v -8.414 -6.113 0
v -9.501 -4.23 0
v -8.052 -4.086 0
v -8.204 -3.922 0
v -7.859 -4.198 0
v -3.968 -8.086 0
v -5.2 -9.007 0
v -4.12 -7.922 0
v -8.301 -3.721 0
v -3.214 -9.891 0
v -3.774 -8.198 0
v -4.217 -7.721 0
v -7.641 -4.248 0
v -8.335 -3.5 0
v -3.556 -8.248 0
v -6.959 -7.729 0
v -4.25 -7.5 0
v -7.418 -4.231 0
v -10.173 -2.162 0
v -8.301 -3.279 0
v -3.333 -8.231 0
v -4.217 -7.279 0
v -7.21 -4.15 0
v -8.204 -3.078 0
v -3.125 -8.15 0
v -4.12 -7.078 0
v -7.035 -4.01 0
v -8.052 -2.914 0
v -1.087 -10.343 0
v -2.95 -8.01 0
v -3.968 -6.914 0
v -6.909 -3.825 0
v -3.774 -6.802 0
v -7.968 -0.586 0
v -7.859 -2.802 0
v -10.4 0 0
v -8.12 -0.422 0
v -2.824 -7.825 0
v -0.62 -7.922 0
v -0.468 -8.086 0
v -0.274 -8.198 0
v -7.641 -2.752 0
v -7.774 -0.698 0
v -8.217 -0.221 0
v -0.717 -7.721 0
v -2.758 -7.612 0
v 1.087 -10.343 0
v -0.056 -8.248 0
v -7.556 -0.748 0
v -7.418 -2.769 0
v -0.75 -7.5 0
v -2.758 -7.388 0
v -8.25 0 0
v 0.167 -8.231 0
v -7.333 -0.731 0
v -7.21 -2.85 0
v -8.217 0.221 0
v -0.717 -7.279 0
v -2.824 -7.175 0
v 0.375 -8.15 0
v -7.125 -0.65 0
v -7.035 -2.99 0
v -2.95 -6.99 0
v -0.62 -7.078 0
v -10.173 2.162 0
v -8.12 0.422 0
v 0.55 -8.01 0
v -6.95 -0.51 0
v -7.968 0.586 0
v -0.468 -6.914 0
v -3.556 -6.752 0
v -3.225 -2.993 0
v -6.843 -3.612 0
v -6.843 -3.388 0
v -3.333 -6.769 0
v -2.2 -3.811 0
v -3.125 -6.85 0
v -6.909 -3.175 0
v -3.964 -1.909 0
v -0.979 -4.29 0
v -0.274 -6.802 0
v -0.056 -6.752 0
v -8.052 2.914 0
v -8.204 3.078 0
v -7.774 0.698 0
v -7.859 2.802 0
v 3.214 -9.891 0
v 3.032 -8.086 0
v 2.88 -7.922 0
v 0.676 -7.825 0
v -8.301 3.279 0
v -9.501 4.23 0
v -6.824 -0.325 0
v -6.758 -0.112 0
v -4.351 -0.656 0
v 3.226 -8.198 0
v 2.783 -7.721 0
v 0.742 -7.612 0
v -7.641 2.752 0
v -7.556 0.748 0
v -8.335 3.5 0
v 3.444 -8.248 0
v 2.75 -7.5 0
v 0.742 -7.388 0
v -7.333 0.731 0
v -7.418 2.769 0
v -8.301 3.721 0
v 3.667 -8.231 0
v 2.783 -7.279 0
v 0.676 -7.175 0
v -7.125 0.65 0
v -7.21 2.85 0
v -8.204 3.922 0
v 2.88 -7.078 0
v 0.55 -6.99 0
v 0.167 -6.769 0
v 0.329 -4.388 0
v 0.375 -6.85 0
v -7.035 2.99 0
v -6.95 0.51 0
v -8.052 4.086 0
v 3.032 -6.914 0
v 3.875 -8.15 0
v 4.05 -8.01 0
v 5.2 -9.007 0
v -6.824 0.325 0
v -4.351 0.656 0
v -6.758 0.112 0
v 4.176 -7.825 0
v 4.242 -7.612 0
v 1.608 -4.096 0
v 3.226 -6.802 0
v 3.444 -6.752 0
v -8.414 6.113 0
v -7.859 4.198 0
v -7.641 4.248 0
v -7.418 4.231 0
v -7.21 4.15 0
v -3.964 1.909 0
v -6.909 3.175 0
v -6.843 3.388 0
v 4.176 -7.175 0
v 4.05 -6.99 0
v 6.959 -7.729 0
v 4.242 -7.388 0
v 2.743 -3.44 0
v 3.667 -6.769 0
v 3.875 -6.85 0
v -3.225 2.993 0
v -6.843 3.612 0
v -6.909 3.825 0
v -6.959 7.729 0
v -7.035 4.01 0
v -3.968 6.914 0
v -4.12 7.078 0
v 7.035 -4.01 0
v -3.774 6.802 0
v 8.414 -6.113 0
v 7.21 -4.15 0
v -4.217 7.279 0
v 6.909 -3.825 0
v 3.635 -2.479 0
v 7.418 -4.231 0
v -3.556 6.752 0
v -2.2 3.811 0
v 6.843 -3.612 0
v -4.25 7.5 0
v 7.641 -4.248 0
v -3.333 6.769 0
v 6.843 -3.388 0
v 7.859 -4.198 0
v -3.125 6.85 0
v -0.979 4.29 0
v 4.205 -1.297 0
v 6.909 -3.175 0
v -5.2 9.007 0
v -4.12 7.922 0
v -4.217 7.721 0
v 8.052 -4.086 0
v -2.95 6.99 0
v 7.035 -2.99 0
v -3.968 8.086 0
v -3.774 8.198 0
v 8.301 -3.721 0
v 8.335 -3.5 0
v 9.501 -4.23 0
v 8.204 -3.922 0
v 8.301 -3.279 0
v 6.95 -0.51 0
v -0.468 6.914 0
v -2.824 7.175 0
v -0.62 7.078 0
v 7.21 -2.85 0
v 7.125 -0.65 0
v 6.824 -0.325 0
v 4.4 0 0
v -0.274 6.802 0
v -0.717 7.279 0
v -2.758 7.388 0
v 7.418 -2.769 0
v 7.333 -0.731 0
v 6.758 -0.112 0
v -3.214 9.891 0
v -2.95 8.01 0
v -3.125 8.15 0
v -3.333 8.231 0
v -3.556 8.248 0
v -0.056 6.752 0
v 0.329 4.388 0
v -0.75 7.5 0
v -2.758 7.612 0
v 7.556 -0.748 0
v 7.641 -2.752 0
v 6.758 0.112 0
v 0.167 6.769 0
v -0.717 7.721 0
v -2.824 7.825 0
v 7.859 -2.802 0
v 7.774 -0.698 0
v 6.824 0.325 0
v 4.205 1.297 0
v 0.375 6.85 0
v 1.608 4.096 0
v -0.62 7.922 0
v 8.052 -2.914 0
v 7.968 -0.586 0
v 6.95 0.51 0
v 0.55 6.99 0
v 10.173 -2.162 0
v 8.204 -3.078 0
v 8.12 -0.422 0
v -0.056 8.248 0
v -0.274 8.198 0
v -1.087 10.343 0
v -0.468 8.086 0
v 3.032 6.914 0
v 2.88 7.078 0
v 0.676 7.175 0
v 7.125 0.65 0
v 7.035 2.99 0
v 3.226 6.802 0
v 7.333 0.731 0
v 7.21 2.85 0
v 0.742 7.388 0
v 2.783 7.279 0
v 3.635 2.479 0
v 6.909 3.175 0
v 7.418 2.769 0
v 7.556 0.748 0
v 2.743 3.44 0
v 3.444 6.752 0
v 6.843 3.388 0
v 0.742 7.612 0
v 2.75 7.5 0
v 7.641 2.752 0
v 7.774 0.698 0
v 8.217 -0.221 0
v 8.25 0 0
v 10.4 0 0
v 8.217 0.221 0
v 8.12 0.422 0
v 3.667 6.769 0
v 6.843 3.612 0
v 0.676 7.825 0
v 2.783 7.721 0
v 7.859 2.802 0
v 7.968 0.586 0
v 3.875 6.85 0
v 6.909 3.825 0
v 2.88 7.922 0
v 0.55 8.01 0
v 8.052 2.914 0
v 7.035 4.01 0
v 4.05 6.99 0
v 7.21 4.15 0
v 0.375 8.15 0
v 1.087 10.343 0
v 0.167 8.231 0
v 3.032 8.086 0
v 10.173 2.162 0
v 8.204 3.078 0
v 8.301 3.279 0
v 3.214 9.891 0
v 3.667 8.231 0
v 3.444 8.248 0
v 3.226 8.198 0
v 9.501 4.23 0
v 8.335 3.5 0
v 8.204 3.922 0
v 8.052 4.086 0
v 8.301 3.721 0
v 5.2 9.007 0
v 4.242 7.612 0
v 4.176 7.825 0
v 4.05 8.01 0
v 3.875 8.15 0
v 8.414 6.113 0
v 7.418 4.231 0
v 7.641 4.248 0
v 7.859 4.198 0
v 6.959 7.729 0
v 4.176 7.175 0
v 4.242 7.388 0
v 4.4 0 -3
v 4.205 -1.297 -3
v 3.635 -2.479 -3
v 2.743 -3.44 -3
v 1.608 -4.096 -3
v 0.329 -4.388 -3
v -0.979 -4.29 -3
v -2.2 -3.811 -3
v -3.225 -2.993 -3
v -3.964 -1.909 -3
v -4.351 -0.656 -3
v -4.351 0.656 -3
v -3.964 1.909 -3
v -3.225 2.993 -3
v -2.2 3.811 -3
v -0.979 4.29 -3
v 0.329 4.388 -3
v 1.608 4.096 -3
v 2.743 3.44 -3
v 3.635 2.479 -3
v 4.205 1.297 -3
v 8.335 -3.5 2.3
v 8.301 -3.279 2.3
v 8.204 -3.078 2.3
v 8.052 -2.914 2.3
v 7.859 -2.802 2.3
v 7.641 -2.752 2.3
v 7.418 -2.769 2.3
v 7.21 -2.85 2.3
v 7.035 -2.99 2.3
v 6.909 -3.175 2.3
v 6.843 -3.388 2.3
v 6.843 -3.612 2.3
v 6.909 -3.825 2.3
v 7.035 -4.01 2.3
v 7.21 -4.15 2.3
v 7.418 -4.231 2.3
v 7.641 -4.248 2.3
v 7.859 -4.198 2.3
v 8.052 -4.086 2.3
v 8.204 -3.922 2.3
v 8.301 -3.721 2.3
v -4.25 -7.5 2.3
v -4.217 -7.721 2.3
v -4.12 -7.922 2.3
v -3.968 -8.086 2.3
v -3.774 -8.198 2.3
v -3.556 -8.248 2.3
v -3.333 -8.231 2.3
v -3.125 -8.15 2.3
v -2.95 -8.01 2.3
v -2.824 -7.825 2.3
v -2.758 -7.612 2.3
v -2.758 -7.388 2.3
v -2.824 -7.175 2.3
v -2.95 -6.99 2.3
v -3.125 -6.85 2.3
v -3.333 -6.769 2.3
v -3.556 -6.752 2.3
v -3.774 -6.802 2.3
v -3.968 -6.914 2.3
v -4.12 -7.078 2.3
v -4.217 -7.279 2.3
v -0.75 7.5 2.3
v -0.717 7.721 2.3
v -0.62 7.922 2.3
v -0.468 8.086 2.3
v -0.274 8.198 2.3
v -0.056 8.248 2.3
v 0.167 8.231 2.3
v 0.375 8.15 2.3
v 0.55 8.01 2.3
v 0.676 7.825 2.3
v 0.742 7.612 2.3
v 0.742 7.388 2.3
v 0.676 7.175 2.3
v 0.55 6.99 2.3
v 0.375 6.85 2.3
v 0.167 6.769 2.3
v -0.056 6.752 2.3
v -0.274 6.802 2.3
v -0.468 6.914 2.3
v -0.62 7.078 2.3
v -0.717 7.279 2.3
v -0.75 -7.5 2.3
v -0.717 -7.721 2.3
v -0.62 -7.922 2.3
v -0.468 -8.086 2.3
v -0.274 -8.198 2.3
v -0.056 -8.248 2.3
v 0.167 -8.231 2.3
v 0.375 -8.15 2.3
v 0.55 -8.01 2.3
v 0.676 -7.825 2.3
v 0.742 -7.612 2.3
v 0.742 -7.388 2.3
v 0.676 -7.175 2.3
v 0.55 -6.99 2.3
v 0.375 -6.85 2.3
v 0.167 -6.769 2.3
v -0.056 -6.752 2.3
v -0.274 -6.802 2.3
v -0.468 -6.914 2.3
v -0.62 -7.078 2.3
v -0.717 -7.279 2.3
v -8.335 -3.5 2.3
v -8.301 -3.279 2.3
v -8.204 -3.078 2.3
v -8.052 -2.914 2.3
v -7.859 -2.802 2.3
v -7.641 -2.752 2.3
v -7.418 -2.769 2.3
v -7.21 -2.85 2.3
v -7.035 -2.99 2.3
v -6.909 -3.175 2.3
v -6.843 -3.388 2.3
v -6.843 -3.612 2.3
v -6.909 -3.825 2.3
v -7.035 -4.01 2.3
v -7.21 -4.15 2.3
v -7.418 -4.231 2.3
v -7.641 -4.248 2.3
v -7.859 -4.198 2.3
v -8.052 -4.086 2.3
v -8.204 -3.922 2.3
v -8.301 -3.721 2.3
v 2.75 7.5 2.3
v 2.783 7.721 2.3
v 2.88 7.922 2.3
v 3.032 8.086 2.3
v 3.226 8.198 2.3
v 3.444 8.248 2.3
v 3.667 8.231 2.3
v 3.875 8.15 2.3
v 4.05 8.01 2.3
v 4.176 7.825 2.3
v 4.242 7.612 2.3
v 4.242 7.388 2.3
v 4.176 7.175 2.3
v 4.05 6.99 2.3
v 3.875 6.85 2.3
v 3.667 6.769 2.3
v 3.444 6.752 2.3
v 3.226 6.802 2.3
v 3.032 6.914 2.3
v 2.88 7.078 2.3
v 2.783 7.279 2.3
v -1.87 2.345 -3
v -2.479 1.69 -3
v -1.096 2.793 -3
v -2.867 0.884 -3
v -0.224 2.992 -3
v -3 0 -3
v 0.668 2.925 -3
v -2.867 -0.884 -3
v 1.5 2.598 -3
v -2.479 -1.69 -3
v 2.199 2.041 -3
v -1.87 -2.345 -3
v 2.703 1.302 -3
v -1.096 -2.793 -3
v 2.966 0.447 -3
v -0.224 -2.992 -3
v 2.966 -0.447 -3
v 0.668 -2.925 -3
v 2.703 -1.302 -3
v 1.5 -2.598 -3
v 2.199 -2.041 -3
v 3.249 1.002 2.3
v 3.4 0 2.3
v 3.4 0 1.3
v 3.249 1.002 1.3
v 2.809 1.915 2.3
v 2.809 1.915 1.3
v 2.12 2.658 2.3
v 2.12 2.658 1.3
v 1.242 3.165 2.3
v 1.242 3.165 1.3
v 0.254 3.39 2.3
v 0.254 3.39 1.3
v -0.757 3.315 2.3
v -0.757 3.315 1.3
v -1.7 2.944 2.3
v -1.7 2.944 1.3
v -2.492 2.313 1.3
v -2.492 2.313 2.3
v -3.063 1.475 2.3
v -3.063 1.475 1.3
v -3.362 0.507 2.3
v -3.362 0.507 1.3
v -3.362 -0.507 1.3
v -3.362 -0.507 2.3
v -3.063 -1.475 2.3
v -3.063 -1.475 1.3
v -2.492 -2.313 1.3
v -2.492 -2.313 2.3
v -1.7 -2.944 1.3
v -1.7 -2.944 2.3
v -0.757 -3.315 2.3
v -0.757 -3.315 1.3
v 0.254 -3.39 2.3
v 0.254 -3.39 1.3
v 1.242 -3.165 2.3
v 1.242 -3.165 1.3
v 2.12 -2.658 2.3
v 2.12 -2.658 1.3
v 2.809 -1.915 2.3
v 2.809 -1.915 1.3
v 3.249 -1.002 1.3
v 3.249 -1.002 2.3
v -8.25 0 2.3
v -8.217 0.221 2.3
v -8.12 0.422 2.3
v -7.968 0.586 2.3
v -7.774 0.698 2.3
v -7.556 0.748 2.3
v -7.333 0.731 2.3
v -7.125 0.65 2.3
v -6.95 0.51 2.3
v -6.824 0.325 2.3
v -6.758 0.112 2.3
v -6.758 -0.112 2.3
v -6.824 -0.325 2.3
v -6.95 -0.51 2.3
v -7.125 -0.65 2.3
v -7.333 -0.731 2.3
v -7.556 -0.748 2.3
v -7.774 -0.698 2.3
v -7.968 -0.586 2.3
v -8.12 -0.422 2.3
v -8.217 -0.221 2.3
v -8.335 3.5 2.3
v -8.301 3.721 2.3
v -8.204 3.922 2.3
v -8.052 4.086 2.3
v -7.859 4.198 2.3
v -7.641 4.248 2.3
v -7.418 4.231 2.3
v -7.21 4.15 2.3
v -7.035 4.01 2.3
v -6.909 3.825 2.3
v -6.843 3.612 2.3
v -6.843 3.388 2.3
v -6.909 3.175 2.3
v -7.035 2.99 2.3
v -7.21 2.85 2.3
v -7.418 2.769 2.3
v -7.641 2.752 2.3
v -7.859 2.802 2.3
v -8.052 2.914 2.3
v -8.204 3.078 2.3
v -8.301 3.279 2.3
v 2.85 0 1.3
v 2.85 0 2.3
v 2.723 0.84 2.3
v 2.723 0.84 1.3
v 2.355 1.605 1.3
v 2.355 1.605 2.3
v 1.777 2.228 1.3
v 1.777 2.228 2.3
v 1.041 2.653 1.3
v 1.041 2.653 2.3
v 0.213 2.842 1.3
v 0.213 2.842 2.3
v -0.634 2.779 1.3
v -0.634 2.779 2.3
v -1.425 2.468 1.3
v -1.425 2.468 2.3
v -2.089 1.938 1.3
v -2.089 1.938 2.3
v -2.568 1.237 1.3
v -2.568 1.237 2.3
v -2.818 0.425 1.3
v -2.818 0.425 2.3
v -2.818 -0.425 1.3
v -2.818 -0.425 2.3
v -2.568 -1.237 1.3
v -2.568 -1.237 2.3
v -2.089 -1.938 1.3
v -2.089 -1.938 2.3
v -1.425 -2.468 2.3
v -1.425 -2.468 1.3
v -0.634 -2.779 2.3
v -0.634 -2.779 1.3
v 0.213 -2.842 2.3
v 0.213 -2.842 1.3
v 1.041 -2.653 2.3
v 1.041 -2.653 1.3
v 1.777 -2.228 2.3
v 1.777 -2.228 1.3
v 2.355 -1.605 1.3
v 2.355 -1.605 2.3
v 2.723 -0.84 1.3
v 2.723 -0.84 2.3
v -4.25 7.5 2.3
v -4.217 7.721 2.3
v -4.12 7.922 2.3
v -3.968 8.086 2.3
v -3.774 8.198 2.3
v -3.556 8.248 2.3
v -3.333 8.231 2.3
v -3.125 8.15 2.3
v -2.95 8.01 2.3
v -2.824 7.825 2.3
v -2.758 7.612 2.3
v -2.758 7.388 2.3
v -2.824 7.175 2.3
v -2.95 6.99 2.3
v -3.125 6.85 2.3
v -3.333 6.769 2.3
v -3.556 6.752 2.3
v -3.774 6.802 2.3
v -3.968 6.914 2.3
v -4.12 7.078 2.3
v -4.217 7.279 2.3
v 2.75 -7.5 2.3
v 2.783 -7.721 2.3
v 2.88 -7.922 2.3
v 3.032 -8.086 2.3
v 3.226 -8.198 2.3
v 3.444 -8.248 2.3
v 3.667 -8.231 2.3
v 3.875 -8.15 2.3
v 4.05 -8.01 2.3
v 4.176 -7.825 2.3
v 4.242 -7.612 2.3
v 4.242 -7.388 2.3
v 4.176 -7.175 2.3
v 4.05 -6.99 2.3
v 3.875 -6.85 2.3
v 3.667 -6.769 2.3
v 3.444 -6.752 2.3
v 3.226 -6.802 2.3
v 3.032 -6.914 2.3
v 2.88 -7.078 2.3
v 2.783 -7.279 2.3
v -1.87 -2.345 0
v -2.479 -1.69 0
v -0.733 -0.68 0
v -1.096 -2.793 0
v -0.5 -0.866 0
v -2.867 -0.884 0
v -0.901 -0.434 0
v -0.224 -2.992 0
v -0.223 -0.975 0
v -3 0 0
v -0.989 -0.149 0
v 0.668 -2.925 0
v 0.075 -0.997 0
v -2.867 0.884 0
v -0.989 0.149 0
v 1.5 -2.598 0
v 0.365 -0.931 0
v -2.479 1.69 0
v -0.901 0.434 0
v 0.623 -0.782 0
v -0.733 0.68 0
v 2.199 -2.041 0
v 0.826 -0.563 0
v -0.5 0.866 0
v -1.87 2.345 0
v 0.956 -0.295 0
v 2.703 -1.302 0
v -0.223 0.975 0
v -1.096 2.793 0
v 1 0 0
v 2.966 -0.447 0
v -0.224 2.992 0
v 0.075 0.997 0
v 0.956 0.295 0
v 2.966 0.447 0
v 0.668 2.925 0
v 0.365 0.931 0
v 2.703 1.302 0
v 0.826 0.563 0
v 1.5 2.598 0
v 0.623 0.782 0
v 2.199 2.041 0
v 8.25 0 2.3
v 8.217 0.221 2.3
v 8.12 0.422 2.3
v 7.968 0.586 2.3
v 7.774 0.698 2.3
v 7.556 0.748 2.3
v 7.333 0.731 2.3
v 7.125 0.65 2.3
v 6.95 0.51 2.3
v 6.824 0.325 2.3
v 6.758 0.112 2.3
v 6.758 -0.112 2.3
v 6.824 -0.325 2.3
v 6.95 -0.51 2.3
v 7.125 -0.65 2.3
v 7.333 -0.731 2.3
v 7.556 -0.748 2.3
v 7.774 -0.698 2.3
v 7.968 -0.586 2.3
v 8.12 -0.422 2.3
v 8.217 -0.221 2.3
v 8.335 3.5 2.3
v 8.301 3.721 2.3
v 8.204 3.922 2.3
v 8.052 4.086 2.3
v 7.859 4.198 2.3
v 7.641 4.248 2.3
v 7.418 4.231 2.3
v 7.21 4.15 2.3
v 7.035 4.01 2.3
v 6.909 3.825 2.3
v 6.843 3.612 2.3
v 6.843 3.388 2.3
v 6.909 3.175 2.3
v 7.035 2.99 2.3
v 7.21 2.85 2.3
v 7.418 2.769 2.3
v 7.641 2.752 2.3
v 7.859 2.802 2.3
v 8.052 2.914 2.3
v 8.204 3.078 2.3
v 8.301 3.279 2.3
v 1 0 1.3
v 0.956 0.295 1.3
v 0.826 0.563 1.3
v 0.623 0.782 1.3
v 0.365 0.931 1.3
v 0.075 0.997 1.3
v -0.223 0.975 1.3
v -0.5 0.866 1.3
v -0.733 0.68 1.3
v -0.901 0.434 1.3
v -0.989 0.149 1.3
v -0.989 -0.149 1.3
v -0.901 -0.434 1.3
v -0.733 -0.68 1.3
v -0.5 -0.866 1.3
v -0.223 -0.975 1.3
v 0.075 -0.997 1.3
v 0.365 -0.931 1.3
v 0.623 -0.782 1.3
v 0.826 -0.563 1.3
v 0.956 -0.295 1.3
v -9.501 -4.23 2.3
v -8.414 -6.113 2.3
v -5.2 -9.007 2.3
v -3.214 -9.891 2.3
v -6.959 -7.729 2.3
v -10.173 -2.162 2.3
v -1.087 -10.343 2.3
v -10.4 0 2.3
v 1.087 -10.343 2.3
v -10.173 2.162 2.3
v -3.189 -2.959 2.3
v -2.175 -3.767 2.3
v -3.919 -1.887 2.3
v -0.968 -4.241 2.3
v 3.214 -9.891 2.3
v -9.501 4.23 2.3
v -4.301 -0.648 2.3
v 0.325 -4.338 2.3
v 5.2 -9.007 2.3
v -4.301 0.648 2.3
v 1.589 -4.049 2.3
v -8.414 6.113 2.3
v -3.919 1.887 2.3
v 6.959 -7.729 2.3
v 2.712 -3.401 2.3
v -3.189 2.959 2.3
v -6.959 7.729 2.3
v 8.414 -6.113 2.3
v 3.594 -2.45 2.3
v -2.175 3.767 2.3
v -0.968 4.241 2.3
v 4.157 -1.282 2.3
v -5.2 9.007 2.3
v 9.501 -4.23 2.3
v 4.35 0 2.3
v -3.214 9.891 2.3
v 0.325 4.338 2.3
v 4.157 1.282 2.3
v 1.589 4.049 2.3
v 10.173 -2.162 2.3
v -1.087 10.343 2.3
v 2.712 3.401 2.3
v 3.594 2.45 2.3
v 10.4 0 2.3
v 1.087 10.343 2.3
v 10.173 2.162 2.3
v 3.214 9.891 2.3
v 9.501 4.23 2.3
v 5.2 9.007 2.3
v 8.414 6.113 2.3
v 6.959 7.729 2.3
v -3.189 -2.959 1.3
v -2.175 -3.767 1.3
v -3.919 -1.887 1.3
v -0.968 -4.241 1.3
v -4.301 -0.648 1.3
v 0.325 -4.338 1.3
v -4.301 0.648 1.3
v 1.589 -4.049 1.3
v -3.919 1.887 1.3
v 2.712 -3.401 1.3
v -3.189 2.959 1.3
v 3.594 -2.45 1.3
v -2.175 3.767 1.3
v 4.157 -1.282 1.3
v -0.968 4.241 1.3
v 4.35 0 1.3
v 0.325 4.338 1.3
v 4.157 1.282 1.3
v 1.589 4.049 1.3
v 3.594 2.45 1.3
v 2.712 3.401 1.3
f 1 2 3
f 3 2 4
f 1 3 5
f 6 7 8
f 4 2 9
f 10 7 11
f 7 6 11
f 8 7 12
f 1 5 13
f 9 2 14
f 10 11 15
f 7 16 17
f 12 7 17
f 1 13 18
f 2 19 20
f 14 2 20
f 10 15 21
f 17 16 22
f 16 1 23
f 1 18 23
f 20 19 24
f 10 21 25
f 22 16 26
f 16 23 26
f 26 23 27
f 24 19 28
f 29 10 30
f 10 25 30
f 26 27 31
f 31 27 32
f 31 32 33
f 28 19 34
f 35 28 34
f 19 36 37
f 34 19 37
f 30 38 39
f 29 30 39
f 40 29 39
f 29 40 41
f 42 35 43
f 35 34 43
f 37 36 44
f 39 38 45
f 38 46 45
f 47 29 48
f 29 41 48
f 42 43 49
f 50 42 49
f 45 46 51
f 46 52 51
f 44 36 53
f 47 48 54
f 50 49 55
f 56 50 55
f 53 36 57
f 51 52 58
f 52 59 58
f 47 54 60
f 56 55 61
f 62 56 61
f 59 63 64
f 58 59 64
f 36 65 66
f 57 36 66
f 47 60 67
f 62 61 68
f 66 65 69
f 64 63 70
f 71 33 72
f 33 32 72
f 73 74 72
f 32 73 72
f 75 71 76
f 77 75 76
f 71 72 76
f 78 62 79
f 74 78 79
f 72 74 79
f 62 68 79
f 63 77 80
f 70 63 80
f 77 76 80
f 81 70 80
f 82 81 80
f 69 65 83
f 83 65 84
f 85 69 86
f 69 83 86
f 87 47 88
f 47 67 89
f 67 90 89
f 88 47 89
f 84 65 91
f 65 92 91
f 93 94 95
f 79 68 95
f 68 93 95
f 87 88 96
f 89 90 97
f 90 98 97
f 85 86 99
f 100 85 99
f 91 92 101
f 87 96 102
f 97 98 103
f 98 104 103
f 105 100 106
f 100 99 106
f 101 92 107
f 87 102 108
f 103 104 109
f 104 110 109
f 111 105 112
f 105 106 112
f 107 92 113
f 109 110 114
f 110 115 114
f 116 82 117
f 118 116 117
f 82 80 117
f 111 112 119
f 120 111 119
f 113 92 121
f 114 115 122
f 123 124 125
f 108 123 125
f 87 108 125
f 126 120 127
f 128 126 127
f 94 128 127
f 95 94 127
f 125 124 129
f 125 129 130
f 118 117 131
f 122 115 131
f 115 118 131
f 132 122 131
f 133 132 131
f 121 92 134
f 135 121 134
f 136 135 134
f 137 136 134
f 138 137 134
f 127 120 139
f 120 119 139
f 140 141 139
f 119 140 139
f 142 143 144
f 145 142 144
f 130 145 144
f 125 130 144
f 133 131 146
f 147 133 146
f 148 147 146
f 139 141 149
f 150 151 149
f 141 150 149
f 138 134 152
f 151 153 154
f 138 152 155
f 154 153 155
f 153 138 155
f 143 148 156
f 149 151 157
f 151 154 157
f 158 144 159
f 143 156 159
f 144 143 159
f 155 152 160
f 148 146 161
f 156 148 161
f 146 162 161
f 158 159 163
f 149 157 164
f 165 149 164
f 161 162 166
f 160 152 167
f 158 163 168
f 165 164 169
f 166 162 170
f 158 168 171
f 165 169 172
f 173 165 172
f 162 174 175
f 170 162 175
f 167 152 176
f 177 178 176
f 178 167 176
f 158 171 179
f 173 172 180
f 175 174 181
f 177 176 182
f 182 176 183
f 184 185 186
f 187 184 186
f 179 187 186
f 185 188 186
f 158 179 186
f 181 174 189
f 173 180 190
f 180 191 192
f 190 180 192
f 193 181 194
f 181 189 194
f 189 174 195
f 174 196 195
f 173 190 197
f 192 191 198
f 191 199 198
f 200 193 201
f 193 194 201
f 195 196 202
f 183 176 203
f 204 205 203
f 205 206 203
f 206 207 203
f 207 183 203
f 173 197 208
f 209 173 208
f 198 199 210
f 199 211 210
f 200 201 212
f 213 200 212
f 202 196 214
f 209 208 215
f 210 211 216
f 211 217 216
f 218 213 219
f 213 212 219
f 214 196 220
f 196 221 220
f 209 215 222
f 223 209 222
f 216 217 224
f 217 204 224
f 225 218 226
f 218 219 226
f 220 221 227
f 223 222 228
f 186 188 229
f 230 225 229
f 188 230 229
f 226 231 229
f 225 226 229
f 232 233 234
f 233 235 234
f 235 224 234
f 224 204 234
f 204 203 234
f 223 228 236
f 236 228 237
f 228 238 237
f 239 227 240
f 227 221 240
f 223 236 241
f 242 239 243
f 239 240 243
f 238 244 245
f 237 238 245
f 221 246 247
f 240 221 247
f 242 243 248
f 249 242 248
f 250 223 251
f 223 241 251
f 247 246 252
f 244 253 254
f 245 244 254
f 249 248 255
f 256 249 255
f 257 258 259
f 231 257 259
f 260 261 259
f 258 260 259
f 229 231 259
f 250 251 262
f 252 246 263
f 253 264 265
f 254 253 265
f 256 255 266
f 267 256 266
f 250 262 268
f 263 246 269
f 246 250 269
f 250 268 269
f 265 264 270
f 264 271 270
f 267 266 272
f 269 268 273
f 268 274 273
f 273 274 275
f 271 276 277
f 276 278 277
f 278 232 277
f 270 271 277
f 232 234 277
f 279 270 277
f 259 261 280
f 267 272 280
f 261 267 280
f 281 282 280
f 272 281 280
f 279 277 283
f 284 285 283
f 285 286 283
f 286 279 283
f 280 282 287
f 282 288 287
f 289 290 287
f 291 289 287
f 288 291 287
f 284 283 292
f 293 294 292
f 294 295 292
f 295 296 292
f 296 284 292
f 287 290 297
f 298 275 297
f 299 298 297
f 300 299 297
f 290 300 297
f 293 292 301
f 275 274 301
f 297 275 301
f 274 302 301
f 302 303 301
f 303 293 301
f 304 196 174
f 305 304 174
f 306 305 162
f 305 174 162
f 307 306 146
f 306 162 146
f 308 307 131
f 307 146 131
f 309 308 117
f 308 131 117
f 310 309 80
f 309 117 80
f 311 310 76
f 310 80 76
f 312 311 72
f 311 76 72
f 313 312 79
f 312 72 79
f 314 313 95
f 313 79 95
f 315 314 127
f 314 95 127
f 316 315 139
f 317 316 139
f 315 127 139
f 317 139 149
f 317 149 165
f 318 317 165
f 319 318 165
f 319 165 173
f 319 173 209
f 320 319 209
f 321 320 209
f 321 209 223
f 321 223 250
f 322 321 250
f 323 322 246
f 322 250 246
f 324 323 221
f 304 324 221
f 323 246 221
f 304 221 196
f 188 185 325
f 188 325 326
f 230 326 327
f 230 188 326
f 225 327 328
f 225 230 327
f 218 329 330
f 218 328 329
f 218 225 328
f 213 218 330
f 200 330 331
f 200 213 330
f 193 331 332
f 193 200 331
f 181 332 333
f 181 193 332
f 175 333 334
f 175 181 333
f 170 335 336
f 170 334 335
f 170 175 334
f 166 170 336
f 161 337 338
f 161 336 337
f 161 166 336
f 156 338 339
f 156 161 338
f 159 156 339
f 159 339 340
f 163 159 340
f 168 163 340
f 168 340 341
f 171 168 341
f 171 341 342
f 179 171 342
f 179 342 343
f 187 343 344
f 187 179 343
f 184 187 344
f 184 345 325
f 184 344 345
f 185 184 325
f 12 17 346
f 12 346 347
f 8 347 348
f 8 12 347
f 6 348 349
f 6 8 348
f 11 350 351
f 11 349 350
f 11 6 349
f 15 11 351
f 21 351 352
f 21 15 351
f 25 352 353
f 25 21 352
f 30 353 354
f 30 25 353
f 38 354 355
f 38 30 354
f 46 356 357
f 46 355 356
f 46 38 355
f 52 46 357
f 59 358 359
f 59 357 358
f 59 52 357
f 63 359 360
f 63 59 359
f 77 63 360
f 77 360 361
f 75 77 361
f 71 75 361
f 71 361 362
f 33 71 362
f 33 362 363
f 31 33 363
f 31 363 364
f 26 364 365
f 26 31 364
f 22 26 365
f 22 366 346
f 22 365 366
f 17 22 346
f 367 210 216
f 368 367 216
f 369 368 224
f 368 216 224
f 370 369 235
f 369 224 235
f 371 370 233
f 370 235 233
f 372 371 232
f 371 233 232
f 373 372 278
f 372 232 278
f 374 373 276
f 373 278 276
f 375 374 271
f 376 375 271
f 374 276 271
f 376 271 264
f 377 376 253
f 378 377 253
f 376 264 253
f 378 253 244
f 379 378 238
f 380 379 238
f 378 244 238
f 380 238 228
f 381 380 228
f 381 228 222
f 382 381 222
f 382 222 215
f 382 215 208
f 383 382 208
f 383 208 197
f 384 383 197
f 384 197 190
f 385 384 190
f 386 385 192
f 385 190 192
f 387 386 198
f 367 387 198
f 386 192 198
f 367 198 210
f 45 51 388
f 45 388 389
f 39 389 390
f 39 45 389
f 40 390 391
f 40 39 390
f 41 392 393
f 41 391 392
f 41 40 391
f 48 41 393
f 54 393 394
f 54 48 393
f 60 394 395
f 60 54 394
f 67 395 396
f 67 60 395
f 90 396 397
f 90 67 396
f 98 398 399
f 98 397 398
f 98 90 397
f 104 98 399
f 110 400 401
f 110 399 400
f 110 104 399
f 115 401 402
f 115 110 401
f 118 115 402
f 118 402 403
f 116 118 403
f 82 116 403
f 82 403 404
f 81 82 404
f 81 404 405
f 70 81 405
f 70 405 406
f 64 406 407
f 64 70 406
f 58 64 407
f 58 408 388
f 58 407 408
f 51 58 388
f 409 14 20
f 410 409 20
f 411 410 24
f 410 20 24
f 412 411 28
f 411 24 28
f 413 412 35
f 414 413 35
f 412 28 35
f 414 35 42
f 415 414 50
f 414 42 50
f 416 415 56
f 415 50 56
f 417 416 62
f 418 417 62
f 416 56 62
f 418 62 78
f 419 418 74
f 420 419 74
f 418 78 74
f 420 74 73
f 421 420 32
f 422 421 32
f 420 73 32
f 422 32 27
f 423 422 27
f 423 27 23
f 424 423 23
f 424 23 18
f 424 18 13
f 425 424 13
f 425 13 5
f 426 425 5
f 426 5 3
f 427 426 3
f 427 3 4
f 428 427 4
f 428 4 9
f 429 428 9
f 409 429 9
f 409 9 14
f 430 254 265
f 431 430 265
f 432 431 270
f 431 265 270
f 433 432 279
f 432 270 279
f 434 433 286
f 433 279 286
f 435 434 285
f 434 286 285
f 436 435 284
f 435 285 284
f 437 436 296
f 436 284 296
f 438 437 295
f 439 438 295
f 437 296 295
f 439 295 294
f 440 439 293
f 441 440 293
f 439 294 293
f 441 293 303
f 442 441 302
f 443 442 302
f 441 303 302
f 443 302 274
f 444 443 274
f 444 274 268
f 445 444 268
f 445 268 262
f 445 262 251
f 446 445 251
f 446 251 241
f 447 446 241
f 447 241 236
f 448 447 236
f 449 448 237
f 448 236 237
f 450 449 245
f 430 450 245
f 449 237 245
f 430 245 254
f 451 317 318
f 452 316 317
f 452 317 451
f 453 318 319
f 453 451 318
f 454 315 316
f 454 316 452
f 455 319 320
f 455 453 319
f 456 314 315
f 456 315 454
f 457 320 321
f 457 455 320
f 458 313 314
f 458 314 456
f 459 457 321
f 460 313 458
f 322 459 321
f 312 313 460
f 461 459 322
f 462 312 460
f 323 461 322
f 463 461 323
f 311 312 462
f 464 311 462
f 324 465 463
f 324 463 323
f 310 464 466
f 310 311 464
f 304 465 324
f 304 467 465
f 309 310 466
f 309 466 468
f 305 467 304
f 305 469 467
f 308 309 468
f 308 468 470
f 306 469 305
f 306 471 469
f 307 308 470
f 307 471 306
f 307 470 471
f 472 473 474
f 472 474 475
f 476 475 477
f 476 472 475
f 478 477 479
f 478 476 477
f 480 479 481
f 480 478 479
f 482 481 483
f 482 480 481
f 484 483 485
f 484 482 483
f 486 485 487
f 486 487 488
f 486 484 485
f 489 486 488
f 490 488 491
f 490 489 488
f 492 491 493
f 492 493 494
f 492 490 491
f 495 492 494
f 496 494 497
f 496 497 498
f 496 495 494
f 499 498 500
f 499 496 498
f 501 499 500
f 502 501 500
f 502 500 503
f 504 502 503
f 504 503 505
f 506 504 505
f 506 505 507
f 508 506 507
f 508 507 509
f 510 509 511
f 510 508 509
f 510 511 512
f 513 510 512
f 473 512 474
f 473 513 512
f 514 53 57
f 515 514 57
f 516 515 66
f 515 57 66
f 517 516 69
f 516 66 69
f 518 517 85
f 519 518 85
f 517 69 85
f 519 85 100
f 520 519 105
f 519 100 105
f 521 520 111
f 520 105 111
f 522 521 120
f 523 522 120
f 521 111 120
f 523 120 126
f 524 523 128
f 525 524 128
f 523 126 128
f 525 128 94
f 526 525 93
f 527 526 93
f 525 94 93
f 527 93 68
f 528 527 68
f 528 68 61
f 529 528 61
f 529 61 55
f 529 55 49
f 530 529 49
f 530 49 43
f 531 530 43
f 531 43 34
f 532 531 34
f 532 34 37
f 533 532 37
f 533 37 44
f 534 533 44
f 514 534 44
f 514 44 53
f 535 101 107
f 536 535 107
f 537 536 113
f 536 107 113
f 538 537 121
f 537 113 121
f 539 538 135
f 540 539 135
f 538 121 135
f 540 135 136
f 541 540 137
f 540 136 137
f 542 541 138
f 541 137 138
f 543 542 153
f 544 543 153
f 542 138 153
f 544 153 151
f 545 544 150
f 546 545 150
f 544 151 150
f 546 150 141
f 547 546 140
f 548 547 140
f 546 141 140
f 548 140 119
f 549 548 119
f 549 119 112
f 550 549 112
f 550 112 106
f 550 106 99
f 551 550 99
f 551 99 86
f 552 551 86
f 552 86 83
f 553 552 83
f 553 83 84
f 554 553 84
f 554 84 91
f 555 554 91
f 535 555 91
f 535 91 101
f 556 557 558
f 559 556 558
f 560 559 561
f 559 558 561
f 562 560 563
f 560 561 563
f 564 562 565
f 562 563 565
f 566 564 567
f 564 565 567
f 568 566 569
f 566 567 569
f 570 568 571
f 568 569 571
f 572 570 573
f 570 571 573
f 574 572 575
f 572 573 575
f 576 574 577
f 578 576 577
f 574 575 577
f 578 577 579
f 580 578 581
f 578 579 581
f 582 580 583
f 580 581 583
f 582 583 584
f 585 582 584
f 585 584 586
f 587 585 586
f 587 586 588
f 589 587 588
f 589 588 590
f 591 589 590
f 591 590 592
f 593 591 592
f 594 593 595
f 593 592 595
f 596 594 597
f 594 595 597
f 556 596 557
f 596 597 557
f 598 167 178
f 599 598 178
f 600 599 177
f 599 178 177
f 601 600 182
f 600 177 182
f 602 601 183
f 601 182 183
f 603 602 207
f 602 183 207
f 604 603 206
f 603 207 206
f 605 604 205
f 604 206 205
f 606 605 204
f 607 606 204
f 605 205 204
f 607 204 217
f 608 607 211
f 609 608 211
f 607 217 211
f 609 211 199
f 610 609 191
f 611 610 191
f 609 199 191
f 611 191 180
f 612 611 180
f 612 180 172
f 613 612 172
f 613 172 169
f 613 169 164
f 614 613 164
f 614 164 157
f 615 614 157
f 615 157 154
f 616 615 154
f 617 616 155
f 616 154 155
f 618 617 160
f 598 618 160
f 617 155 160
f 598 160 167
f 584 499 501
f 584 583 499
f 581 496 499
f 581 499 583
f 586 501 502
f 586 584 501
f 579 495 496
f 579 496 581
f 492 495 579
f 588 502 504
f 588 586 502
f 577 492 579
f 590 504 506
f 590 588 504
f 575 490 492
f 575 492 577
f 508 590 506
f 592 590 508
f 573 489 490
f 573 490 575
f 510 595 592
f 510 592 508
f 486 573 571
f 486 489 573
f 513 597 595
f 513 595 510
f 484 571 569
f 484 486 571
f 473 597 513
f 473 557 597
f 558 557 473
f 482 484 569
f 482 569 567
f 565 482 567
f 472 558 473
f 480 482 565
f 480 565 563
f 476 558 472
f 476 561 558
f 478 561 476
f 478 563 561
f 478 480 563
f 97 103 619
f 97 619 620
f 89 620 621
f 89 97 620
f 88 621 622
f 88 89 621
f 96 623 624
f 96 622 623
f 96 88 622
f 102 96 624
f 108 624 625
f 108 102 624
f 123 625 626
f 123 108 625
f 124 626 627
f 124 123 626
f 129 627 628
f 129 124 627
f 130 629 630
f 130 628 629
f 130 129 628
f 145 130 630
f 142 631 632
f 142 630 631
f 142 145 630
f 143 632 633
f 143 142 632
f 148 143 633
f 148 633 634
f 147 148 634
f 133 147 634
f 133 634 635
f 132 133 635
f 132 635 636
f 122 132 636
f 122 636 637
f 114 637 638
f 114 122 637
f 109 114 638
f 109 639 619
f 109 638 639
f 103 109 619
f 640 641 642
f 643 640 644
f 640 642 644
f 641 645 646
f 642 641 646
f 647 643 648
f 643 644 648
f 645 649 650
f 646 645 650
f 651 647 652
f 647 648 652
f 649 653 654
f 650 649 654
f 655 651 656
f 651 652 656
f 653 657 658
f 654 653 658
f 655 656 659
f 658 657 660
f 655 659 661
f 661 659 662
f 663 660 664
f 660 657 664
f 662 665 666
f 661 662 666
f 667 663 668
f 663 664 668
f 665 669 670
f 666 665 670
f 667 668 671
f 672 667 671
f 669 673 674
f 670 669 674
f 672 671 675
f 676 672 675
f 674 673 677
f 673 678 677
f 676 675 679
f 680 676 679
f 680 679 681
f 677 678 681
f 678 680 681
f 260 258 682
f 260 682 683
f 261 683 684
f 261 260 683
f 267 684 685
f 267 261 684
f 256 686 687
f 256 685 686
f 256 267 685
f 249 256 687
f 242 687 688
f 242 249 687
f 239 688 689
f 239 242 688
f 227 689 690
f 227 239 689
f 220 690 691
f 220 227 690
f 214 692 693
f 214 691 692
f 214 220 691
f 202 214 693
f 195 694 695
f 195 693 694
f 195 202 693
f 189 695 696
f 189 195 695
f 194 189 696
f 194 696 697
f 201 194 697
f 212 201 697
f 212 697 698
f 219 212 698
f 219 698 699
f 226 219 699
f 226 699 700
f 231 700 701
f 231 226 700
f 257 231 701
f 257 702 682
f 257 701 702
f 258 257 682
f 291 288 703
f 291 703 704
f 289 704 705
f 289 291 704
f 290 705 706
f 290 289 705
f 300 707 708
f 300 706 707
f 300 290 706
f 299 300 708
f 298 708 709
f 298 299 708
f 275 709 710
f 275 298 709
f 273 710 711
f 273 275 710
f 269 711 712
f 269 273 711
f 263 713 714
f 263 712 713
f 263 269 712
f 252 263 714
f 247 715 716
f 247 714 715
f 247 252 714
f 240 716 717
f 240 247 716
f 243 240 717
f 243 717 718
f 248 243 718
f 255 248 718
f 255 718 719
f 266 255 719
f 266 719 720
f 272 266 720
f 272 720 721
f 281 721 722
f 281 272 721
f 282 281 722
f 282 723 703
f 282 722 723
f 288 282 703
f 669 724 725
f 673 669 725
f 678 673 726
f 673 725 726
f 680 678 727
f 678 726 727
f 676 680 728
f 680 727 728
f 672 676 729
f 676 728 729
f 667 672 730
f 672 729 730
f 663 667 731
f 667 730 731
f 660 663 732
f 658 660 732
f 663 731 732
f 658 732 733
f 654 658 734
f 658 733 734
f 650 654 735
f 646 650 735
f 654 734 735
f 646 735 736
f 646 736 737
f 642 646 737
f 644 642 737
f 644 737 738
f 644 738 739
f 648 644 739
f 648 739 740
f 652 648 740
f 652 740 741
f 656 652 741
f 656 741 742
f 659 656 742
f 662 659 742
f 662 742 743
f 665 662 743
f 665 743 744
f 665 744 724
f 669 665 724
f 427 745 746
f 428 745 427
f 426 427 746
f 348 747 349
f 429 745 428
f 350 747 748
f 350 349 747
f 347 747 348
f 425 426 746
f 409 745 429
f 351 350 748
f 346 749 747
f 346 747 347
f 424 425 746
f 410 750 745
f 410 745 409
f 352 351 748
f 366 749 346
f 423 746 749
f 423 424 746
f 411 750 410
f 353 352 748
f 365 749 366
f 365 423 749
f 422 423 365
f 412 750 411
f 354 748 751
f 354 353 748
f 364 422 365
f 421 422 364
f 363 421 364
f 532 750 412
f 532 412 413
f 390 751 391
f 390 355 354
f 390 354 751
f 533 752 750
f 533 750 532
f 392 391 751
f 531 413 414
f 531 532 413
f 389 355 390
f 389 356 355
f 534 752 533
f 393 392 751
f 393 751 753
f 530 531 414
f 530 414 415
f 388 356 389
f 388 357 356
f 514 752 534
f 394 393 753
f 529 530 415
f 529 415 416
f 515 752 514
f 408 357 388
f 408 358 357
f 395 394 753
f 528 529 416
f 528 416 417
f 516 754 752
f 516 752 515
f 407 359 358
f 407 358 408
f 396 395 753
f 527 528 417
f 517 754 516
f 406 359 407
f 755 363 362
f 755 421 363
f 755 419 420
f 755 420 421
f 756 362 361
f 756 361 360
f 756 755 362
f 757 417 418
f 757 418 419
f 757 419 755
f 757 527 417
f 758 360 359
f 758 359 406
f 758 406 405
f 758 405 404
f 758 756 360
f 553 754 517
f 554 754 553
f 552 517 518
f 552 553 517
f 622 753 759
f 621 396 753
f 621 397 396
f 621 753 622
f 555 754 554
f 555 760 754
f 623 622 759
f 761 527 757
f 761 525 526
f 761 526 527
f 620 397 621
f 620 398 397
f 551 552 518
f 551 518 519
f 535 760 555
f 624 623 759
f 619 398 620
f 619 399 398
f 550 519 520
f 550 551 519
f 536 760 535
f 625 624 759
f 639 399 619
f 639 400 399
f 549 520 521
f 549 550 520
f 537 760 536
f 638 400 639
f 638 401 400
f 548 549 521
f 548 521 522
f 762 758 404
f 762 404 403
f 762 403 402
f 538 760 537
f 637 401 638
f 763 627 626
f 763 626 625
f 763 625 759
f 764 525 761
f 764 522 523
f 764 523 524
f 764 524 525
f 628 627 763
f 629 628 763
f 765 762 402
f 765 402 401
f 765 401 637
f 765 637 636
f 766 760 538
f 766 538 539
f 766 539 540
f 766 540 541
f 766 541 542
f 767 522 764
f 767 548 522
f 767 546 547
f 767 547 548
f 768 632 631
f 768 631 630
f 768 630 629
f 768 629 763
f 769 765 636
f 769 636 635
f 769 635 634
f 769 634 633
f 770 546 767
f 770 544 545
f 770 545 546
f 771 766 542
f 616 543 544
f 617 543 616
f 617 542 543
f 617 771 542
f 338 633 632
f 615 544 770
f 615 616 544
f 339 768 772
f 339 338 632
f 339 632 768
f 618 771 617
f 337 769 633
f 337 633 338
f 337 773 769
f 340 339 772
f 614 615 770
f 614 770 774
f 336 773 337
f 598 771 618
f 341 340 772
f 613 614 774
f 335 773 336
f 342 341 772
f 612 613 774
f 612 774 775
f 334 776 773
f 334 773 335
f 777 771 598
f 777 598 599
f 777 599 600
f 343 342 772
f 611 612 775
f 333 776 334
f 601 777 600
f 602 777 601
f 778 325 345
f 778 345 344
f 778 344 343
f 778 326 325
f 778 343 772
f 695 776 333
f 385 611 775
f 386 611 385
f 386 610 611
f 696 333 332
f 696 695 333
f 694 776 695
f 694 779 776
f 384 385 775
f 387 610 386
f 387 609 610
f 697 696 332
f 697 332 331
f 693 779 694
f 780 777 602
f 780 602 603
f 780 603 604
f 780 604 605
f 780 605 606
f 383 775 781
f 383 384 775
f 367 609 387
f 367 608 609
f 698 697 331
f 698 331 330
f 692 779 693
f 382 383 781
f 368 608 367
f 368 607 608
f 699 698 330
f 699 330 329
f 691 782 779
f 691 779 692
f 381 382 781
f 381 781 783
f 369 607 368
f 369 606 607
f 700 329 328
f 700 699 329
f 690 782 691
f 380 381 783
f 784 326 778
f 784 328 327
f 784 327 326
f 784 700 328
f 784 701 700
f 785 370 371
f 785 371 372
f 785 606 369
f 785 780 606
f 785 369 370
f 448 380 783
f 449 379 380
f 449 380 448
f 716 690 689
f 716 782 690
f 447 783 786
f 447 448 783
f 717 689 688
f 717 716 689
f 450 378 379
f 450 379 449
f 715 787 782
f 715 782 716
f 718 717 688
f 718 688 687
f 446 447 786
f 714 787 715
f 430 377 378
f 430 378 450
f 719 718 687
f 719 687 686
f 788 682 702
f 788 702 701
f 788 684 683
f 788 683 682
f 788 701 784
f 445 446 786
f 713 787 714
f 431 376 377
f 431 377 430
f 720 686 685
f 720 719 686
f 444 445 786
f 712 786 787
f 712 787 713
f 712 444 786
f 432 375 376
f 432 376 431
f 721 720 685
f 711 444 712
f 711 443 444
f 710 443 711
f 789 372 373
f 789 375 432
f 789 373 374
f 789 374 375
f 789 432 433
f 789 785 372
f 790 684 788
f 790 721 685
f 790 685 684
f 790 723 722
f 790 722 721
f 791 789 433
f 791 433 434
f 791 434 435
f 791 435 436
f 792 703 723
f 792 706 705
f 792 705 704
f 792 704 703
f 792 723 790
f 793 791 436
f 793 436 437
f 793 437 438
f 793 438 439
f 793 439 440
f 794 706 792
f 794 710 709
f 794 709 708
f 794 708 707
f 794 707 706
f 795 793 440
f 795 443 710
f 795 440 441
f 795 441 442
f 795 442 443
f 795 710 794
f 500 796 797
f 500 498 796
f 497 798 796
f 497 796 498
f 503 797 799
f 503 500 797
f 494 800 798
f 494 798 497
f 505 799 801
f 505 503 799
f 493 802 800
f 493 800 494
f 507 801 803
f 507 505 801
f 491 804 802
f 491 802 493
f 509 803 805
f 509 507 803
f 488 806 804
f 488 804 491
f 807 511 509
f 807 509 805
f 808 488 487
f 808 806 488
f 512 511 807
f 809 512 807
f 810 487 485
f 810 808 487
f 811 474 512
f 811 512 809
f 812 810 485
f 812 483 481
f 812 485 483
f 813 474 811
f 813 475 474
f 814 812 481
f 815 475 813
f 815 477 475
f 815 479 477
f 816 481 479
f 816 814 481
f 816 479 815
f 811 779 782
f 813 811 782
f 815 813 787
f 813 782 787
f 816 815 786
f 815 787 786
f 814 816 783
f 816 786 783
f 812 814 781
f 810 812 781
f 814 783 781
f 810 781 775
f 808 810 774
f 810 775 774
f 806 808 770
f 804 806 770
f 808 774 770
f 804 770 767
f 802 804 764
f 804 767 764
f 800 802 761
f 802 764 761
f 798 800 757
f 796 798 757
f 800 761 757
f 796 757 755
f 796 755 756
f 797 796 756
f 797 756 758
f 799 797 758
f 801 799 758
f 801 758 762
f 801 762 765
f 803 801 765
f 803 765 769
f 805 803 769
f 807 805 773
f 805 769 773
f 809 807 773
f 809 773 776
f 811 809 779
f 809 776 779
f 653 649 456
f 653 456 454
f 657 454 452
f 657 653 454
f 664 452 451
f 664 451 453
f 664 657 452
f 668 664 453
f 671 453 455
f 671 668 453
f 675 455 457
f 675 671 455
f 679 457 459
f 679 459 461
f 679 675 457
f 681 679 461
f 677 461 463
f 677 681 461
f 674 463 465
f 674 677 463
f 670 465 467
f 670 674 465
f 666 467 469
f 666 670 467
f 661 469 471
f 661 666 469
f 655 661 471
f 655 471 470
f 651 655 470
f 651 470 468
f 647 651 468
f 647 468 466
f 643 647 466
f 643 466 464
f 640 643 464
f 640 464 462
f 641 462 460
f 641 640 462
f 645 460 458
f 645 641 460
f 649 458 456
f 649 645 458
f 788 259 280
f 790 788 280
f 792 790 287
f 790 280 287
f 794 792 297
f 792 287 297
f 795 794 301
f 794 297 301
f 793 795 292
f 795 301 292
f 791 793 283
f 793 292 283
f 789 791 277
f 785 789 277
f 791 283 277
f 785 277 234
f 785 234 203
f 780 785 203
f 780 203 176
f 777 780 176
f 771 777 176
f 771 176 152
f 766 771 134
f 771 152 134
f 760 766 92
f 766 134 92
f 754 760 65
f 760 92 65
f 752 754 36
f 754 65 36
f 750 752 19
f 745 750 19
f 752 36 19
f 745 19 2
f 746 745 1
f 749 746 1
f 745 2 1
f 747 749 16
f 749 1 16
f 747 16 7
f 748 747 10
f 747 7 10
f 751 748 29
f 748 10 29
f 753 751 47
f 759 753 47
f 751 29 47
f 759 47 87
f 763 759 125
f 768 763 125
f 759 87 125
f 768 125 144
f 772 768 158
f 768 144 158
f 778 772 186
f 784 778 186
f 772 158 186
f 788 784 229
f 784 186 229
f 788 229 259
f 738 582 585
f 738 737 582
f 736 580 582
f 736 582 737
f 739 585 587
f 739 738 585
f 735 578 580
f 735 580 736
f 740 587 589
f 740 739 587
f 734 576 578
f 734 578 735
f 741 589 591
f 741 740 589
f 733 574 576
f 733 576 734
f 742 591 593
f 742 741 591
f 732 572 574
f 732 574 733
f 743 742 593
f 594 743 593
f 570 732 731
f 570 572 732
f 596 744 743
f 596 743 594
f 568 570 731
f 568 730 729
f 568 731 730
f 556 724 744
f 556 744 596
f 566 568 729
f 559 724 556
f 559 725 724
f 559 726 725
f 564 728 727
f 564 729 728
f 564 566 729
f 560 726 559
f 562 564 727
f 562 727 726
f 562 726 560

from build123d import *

# Parameters (mm, degrees)
SKETCH1_R                    = 10.4
BOSS_EXTRUDE1_DEPTH          = 2.3
F_96_0_0063_DIAMETER_HOLE1_D = 1.500000048
SKETCH9_R                    = 4.4
SKETCH9_R_2                  = 3
BOSS_EXTRUDE2_DEPTH          = 3
SKETCH10_R                   = 4.35
SKETCH10_R_2                 = 3.4
CUT_EXTRUDE1_DEPTH           = 1
SKETCH11_R                   = 2.85
CUT_EXTRUDE2_DEPTH           = 1
SKETCH12_R                   = 1
CUT_EXTRUDE3_DEPTH           = 4


with BuildPart() as part:
    # Sketch1 → Boss-Extrude1 (new body)
    with BuildSketch(Plane.XY):
        Circle(SKETCH1_R)
    extrude(amount=BOSS_EXTRUDE1_DEPTH)

    # #96 (0.0063) Diameter Hole1 (through all)
    with Locations(Plane.XY.offset(2.3)):
        with Locations((0, 7.5), (-3.5, 7.5), (3.5, 7.5), (-7.5, 0), (-7.584790225, 3.5), (-7.584790225, -3.5)):
            f_96_0_0063_diameter_hole1 = Hole(F_96_0_0063_DIAMETER_HOLE1_D / 2)

    # Mirror1: #96 (0.0063) Diameter Hole1 across plane
    add(f_96_0_0063_diameter_hole1.mirror(Plane.ZX), mode=Mode.SUBTRACT)

    # Mirror2: #96 (0.0063) Diameter Hole1 across plane
    add(f_96_0_0063_diameter_hole1.mirror(Plane(origin=(0, 0, 0), x_dir=(0, 0, 1), z_dir=(1, 0, 0))), mode=Mode.SUBTRACT)

    # Sketch9 → Boss-Extrude2 (add)
    with BuildSketch(Plane(origin=(0, 0, 0), x_dir=(-1, 0, 0), z_dir=(0, 0, -1))):
        with Locations(Location((0, 0, 0), (0, 0, 180))):
            Circle(SKETCH9_R)
        Circle(SKETCH9_R_2, mode=Mode.SUBTRACT)
    extrude(amount=BOSS_EXTRUDE2_DEPTH)

    # Sketch10 → Cut-Extrude1 (cut)
    with BuildSketch(Plane.XY.offset(2.3)):
        Circle(SKETCH10_R)
        Circle(SKETCH10_R_2, mode=Mode.SUBTRACT)
    extrude(amount=-CUT_EXTRUDE1_DEPTH, mode=Mode.SUBTRACT)

    # Sketch11 → Cut-Extrude2 (cut)
    with BuildSketch(Plane.XY.offset(2.3)):
        Circle(SKETCH11_R)
    extrude(amount=-CUT_EXTRUDE2_DEPTH, mode=Mode.SUBTRACT)

    # Sketch12 → Cut-Extrude3 (cut)
    with BuildSketch(Plane.XY.offset(1.3)):
        Circle(SKETCH12_R)
    extrude(amount=-CUT_EXTRUDE3_DEPTH, mode=Mode.SUBTRACT)


solid = part.part
